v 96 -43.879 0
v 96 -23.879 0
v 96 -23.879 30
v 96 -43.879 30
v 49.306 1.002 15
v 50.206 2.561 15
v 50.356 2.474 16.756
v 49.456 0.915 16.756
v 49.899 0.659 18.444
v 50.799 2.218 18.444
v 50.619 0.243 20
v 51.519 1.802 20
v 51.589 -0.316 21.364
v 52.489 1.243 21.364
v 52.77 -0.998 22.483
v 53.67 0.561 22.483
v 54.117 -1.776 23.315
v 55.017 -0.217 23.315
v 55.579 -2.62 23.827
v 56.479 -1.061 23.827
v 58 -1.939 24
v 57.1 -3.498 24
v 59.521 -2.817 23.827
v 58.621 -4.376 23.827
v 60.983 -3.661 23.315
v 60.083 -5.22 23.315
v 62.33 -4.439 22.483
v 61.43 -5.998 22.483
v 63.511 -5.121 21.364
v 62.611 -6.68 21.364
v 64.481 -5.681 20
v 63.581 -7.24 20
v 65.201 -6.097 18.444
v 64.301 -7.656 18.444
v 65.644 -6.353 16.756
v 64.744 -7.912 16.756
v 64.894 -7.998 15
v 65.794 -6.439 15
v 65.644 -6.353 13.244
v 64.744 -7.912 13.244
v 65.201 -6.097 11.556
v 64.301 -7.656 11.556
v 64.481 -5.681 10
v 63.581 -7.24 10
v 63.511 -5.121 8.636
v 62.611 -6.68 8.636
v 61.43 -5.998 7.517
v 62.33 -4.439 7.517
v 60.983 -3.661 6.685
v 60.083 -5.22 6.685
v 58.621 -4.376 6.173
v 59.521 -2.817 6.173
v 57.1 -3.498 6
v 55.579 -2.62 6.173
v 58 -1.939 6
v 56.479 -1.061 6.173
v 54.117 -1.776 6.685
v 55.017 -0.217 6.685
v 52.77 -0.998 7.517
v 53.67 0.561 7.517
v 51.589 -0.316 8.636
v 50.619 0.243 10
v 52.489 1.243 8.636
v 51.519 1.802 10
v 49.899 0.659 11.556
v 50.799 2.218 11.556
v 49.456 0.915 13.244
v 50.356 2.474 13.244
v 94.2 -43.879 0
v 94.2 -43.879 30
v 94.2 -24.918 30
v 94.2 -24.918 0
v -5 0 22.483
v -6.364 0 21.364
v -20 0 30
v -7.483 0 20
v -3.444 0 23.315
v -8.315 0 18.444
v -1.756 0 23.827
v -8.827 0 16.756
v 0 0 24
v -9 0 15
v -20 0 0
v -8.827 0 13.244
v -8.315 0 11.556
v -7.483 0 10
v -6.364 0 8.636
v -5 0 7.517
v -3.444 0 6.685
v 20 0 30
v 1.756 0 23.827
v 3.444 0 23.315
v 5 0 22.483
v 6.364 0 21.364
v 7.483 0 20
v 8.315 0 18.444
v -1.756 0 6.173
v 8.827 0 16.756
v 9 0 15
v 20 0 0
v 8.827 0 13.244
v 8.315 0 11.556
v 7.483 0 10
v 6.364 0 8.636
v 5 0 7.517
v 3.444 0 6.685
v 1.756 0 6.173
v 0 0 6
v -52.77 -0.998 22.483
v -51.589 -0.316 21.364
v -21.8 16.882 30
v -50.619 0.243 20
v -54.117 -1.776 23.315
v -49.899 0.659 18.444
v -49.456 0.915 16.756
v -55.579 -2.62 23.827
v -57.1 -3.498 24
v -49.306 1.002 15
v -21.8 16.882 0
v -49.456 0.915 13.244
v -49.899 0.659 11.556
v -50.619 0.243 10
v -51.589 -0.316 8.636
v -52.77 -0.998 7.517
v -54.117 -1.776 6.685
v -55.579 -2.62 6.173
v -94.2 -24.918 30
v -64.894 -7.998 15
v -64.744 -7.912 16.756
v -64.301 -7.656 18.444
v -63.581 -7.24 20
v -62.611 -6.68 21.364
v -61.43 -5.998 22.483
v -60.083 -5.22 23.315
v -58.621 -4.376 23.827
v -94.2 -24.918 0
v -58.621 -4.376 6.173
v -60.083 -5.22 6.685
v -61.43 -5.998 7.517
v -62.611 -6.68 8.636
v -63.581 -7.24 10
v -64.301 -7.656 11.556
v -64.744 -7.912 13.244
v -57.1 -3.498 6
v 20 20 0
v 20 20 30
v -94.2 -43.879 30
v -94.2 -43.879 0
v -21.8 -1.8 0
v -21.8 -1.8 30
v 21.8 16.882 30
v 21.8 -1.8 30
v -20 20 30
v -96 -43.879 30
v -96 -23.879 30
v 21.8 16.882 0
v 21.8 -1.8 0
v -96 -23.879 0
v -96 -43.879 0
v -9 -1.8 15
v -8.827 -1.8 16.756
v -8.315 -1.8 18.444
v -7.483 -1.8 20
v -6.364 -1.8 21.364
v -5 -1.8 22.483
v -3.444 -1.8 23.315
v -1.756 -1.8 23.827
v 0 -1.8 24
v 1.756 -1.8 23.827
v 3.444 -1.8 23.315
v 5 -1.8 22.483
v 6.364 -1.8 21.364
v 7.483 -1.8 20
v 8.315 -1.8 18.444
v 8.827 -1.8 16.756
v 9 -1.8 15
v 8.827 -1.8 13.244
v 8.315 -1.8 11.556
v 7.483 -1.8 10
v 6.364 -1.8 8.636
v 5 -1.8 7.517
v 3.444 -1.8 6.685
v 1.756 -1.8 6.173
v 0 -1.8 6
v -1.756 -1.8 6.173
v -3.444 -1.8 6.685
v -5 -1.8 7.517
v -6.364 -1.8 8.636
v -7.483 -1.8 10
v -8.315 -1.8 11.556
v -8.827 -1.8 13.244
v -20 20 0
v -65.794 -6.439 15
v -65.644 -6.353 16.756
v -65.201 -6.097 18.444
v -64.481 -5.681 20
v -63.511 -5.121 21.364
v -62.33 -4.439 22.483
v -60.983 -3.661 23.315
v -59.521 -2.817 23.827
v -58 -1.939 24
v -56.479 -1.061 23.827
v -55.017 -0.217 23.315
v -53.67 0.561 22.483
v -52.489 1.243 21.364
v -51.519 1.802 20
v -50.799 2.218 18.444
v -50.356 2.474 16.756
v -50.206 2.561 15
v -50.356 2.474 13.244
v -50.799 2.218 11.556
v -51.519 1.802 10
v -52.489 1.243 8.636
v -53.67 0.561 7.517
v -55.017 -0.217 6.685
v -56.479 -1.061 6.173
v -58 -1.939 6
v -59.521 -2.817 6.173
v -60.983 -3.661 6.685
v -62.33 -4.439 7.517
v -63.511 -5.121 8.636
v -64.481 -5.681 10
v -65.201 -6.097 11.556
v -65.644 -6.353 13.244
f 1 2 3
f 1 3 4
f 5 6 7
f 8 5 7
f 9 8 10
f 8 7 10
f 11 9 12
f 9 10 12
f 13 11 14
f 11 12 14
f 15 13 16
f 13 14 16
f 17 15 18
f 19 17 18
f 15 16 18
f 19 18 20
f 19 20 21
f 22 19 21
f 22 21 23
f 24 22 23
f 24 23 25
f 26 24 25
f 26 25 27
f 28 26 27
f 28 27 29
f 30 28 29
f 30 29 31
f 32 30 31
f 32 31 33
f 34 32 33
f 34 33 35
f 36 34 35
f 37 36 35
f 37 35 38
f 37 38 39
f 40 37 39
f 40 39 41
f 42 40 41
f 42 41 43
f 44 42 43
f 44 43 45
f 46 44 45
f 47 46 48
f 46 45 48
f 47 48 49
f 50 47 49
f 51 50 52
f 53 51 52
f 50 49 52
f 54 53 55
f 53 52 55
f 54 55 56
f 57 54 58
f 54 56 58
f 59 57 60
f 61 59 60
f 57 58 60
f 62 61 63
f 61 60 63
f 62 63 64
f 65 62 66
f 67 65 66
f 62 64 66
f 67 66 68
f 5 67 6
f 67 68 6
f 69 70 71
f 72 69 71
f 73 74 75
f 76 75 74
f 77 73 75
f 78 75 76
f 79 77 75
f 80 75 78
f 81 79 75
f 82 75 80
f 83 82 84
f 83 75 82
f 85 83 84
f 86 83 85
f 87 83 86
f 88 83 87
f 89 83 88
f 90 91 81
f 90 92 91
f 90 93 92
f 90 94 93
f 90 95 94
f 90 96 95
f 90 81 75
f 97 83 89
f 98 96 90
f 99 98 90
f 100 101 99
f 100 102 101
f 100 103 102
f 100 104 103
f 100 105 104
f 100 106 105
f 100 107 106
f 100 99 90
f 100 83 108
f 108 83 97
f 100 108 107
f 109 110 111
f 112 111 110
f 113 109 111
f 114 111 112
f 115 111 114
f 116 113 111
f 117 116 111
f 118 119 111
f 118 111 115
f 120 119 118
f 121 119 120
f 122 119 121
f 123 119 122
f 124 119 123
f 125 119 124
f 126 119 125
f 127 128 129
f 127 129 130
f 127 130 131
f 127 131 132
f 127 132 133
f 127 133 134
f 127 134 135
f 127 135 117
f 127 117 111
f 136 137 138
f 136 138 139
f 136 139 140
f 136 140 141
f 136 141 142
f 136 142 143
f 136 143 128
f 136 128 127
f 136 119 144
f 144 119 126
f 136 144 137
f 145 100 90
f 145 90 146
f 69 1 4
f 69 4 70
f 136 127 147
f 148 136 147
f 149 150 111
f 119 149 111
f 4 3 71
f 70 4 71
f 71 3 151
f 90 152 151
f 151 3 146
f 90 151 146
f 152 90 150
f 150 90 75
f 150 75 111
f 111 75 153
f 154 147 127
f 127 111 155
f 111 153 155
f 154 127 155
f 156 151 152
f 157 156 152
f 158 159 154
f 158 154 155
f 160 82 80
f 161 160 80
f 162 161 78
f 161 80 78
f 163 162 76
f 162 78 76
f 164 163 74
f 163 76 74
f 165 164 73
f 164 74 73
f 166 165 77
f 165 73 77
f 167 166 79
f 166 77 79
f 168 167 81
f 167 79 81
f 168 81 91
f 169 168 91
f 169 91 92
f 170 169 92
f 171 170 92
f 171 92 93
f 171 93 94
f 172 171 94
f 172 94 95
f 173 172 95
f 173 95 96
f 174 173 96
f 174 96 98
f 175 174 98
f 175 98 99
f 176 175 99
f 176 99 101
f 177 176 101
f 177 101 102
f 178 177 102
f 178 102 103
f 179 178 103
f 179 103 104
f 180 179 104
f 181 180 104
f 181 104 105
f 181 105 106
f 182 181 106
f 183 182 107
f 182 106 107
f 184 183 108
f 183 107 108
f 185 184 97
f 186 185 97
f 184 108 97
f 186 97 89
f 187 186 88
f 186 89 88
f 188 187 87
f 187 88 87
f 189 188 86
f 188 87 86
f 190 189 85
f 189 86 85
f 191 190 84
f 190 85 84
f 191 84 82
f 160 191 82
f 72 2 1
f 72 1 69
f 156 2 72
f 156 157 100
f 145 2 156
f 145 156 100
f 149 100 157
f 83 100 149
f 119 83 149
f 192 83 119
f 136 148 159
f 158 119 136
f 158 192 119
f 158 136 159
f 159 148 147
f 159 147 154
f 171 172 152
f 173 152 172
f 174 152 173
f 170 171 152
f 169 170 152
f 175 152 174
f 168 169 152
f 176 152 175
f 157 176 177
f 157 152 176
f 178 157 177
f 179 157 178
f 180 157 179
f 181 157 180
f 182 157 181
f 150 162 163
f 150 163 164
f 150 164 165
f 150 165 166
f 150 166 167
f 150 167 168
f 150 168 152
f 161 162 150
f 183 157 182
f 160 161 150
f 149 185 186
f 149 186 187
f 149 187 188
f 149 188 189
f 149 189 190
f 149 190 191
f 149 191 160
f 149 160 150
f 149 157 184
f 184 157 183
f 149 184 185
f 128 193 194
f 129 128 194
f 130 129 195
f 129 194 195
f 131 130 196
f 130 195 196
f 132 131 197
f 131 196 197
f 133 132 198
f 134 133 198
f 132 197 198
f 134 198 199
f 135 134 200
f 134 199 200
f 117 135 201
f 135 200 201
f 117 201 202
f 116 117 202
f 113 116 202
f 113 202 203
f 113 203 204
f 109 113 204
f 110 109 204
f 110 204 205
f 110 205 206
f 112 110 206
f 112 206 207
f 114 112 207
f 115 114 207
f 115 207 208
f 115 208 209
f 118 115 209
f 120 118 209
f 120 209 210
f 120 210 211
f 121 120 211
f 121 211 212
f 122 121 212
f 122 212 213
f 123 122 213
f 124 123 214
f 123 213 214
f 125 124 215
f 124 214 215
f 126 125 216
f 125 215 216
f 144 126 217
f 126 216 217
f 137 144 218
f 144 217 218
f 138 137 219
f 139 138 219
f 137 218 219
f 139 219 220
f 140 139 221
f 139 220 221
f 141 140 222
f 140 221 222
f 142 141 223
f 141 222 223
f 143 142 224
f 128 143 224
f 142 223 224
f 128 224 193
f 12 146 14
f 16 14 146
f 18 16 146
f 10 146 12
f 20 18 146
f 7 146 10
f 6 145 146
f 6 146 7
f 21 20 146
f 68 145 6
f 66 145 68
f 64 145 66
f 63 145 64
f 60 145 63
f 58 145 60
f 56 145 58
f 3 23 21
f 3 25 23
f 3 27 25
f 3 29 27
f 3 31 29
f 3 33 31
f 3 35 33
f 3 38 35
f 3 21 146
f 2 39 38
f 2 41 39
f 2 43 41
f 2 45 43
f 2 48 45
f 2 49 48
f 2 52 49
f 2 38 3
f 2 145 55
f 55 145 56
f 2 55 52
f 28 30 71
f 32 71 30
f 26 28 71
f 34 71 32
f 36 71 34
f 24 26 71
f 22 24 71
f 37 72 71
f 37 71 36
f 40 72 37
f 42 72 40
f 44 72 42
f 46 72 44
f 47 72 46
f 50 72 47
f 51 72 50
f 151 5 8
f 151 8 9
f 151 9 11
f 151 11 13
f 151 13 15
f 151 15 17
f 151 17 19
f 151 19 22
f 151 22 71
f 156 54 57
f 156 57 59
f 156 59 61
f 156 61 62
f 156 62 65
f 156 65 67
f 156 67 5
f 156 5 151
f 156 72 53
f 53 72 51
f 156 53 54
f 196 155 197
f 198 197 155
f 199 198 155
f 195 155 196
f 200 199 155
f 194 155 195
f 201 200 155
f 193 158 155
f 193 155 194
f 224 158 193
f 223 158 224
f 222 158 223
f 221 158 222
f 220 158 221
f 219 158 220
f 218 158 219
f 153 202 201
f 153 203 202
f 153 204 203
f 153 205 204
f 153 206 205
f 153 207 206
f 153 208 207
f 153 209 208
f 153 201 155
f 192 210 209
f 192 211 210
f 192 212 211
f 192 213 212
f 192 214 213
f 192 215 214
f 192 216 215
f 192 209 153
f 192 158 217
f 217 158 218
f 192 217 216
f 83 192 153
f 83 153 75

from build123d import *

# Parameters (mm, degrees)
SALIENTE_EXTRUIR1_DEPTH = 30
CROQUIS2_R              = 9
CORTAR_EXTRUIR1_DEPTH   = 110.733009315
CROQUIS3_R              = 9
CORTAR_EXTRUIR2_DEPTH   = 30
CROQUIS4_R              = 9
CORTAR_EXTRUIR3_DEPTH   = 30


with BuildPart() as part:
    # Croquis1 → Saliente-Extruir1 (new body)
    with BuildSketch(Plane.XY):
        Polygon((-20, 0), (20, 0), (20, 20), (96, -23.878620458), (96, -43.878620458), (94.2, -43.878620458), (94.2, -24.917850943), (21.8, 16.882308546), (21.8, -1.8), (-21.8, -1.8), (-21.8, 16.882308546), (-94.2, -24.917850943), (-94.2, -43.878620458), (-96, -43.878620458), (-96, -23.878620458), (-20, 20), align=None)
    extrude(amount=SALIENTE_EXTRUIR1_DEPTH)

    # Croquis2 → Cortar-Extruir1 (cut, through all)
    with BuildSketch(Plane(origin=(0, 0, 0), x_dir=(1, 0, 0), z_dir=(0, 1, 0))):
        with Locations(Location((0, -15, 0), (0, 0, 180))):
            Circle(CROQUIS2_R)
    extrude(amount=-CORTAR_EXTRUIR1_DEPTH, mode=Mode.SUBTRACT)

    # Croquis3 → Cortar-Extruir2 (cut)
    with BuildSketch(Plane(origin=(13.660254038, 23.660254038, 0), x_dir=(0.866025403784438, -0.5000000000000012, 0), z_dir=(0.5000000000000012, 0.866025403784438, 0))):
        with Locations(Location((51.199128534, -15, 0), (0, 0, 180))):
            Circle(CROQUIS3_R)
    extrude(amount=-CORTAR_EXTRUIR2_DEPTH, mode=Mode.SUBTRACT)

    # Croquis4 → Cortar-Extruir3 (cut)
    with BuildSketch(Plane(origin=(-13.660254038, 23.660254038, 0), x_dir=(0.8660254037844378, 0.5000000000000017, 0), z_dir=(-0.5000000000000016, 0.8660254037844377, 0))):
        with Locations(Location((-51.199128534, -15, 0), (0, 0, 180))):
            Circle(CROQUIS4_R)
    extrude(amount=-CORTAR_EXTRUIR3_DEPTH, mode=Mode.SUBTRACT)


solid = part.part
